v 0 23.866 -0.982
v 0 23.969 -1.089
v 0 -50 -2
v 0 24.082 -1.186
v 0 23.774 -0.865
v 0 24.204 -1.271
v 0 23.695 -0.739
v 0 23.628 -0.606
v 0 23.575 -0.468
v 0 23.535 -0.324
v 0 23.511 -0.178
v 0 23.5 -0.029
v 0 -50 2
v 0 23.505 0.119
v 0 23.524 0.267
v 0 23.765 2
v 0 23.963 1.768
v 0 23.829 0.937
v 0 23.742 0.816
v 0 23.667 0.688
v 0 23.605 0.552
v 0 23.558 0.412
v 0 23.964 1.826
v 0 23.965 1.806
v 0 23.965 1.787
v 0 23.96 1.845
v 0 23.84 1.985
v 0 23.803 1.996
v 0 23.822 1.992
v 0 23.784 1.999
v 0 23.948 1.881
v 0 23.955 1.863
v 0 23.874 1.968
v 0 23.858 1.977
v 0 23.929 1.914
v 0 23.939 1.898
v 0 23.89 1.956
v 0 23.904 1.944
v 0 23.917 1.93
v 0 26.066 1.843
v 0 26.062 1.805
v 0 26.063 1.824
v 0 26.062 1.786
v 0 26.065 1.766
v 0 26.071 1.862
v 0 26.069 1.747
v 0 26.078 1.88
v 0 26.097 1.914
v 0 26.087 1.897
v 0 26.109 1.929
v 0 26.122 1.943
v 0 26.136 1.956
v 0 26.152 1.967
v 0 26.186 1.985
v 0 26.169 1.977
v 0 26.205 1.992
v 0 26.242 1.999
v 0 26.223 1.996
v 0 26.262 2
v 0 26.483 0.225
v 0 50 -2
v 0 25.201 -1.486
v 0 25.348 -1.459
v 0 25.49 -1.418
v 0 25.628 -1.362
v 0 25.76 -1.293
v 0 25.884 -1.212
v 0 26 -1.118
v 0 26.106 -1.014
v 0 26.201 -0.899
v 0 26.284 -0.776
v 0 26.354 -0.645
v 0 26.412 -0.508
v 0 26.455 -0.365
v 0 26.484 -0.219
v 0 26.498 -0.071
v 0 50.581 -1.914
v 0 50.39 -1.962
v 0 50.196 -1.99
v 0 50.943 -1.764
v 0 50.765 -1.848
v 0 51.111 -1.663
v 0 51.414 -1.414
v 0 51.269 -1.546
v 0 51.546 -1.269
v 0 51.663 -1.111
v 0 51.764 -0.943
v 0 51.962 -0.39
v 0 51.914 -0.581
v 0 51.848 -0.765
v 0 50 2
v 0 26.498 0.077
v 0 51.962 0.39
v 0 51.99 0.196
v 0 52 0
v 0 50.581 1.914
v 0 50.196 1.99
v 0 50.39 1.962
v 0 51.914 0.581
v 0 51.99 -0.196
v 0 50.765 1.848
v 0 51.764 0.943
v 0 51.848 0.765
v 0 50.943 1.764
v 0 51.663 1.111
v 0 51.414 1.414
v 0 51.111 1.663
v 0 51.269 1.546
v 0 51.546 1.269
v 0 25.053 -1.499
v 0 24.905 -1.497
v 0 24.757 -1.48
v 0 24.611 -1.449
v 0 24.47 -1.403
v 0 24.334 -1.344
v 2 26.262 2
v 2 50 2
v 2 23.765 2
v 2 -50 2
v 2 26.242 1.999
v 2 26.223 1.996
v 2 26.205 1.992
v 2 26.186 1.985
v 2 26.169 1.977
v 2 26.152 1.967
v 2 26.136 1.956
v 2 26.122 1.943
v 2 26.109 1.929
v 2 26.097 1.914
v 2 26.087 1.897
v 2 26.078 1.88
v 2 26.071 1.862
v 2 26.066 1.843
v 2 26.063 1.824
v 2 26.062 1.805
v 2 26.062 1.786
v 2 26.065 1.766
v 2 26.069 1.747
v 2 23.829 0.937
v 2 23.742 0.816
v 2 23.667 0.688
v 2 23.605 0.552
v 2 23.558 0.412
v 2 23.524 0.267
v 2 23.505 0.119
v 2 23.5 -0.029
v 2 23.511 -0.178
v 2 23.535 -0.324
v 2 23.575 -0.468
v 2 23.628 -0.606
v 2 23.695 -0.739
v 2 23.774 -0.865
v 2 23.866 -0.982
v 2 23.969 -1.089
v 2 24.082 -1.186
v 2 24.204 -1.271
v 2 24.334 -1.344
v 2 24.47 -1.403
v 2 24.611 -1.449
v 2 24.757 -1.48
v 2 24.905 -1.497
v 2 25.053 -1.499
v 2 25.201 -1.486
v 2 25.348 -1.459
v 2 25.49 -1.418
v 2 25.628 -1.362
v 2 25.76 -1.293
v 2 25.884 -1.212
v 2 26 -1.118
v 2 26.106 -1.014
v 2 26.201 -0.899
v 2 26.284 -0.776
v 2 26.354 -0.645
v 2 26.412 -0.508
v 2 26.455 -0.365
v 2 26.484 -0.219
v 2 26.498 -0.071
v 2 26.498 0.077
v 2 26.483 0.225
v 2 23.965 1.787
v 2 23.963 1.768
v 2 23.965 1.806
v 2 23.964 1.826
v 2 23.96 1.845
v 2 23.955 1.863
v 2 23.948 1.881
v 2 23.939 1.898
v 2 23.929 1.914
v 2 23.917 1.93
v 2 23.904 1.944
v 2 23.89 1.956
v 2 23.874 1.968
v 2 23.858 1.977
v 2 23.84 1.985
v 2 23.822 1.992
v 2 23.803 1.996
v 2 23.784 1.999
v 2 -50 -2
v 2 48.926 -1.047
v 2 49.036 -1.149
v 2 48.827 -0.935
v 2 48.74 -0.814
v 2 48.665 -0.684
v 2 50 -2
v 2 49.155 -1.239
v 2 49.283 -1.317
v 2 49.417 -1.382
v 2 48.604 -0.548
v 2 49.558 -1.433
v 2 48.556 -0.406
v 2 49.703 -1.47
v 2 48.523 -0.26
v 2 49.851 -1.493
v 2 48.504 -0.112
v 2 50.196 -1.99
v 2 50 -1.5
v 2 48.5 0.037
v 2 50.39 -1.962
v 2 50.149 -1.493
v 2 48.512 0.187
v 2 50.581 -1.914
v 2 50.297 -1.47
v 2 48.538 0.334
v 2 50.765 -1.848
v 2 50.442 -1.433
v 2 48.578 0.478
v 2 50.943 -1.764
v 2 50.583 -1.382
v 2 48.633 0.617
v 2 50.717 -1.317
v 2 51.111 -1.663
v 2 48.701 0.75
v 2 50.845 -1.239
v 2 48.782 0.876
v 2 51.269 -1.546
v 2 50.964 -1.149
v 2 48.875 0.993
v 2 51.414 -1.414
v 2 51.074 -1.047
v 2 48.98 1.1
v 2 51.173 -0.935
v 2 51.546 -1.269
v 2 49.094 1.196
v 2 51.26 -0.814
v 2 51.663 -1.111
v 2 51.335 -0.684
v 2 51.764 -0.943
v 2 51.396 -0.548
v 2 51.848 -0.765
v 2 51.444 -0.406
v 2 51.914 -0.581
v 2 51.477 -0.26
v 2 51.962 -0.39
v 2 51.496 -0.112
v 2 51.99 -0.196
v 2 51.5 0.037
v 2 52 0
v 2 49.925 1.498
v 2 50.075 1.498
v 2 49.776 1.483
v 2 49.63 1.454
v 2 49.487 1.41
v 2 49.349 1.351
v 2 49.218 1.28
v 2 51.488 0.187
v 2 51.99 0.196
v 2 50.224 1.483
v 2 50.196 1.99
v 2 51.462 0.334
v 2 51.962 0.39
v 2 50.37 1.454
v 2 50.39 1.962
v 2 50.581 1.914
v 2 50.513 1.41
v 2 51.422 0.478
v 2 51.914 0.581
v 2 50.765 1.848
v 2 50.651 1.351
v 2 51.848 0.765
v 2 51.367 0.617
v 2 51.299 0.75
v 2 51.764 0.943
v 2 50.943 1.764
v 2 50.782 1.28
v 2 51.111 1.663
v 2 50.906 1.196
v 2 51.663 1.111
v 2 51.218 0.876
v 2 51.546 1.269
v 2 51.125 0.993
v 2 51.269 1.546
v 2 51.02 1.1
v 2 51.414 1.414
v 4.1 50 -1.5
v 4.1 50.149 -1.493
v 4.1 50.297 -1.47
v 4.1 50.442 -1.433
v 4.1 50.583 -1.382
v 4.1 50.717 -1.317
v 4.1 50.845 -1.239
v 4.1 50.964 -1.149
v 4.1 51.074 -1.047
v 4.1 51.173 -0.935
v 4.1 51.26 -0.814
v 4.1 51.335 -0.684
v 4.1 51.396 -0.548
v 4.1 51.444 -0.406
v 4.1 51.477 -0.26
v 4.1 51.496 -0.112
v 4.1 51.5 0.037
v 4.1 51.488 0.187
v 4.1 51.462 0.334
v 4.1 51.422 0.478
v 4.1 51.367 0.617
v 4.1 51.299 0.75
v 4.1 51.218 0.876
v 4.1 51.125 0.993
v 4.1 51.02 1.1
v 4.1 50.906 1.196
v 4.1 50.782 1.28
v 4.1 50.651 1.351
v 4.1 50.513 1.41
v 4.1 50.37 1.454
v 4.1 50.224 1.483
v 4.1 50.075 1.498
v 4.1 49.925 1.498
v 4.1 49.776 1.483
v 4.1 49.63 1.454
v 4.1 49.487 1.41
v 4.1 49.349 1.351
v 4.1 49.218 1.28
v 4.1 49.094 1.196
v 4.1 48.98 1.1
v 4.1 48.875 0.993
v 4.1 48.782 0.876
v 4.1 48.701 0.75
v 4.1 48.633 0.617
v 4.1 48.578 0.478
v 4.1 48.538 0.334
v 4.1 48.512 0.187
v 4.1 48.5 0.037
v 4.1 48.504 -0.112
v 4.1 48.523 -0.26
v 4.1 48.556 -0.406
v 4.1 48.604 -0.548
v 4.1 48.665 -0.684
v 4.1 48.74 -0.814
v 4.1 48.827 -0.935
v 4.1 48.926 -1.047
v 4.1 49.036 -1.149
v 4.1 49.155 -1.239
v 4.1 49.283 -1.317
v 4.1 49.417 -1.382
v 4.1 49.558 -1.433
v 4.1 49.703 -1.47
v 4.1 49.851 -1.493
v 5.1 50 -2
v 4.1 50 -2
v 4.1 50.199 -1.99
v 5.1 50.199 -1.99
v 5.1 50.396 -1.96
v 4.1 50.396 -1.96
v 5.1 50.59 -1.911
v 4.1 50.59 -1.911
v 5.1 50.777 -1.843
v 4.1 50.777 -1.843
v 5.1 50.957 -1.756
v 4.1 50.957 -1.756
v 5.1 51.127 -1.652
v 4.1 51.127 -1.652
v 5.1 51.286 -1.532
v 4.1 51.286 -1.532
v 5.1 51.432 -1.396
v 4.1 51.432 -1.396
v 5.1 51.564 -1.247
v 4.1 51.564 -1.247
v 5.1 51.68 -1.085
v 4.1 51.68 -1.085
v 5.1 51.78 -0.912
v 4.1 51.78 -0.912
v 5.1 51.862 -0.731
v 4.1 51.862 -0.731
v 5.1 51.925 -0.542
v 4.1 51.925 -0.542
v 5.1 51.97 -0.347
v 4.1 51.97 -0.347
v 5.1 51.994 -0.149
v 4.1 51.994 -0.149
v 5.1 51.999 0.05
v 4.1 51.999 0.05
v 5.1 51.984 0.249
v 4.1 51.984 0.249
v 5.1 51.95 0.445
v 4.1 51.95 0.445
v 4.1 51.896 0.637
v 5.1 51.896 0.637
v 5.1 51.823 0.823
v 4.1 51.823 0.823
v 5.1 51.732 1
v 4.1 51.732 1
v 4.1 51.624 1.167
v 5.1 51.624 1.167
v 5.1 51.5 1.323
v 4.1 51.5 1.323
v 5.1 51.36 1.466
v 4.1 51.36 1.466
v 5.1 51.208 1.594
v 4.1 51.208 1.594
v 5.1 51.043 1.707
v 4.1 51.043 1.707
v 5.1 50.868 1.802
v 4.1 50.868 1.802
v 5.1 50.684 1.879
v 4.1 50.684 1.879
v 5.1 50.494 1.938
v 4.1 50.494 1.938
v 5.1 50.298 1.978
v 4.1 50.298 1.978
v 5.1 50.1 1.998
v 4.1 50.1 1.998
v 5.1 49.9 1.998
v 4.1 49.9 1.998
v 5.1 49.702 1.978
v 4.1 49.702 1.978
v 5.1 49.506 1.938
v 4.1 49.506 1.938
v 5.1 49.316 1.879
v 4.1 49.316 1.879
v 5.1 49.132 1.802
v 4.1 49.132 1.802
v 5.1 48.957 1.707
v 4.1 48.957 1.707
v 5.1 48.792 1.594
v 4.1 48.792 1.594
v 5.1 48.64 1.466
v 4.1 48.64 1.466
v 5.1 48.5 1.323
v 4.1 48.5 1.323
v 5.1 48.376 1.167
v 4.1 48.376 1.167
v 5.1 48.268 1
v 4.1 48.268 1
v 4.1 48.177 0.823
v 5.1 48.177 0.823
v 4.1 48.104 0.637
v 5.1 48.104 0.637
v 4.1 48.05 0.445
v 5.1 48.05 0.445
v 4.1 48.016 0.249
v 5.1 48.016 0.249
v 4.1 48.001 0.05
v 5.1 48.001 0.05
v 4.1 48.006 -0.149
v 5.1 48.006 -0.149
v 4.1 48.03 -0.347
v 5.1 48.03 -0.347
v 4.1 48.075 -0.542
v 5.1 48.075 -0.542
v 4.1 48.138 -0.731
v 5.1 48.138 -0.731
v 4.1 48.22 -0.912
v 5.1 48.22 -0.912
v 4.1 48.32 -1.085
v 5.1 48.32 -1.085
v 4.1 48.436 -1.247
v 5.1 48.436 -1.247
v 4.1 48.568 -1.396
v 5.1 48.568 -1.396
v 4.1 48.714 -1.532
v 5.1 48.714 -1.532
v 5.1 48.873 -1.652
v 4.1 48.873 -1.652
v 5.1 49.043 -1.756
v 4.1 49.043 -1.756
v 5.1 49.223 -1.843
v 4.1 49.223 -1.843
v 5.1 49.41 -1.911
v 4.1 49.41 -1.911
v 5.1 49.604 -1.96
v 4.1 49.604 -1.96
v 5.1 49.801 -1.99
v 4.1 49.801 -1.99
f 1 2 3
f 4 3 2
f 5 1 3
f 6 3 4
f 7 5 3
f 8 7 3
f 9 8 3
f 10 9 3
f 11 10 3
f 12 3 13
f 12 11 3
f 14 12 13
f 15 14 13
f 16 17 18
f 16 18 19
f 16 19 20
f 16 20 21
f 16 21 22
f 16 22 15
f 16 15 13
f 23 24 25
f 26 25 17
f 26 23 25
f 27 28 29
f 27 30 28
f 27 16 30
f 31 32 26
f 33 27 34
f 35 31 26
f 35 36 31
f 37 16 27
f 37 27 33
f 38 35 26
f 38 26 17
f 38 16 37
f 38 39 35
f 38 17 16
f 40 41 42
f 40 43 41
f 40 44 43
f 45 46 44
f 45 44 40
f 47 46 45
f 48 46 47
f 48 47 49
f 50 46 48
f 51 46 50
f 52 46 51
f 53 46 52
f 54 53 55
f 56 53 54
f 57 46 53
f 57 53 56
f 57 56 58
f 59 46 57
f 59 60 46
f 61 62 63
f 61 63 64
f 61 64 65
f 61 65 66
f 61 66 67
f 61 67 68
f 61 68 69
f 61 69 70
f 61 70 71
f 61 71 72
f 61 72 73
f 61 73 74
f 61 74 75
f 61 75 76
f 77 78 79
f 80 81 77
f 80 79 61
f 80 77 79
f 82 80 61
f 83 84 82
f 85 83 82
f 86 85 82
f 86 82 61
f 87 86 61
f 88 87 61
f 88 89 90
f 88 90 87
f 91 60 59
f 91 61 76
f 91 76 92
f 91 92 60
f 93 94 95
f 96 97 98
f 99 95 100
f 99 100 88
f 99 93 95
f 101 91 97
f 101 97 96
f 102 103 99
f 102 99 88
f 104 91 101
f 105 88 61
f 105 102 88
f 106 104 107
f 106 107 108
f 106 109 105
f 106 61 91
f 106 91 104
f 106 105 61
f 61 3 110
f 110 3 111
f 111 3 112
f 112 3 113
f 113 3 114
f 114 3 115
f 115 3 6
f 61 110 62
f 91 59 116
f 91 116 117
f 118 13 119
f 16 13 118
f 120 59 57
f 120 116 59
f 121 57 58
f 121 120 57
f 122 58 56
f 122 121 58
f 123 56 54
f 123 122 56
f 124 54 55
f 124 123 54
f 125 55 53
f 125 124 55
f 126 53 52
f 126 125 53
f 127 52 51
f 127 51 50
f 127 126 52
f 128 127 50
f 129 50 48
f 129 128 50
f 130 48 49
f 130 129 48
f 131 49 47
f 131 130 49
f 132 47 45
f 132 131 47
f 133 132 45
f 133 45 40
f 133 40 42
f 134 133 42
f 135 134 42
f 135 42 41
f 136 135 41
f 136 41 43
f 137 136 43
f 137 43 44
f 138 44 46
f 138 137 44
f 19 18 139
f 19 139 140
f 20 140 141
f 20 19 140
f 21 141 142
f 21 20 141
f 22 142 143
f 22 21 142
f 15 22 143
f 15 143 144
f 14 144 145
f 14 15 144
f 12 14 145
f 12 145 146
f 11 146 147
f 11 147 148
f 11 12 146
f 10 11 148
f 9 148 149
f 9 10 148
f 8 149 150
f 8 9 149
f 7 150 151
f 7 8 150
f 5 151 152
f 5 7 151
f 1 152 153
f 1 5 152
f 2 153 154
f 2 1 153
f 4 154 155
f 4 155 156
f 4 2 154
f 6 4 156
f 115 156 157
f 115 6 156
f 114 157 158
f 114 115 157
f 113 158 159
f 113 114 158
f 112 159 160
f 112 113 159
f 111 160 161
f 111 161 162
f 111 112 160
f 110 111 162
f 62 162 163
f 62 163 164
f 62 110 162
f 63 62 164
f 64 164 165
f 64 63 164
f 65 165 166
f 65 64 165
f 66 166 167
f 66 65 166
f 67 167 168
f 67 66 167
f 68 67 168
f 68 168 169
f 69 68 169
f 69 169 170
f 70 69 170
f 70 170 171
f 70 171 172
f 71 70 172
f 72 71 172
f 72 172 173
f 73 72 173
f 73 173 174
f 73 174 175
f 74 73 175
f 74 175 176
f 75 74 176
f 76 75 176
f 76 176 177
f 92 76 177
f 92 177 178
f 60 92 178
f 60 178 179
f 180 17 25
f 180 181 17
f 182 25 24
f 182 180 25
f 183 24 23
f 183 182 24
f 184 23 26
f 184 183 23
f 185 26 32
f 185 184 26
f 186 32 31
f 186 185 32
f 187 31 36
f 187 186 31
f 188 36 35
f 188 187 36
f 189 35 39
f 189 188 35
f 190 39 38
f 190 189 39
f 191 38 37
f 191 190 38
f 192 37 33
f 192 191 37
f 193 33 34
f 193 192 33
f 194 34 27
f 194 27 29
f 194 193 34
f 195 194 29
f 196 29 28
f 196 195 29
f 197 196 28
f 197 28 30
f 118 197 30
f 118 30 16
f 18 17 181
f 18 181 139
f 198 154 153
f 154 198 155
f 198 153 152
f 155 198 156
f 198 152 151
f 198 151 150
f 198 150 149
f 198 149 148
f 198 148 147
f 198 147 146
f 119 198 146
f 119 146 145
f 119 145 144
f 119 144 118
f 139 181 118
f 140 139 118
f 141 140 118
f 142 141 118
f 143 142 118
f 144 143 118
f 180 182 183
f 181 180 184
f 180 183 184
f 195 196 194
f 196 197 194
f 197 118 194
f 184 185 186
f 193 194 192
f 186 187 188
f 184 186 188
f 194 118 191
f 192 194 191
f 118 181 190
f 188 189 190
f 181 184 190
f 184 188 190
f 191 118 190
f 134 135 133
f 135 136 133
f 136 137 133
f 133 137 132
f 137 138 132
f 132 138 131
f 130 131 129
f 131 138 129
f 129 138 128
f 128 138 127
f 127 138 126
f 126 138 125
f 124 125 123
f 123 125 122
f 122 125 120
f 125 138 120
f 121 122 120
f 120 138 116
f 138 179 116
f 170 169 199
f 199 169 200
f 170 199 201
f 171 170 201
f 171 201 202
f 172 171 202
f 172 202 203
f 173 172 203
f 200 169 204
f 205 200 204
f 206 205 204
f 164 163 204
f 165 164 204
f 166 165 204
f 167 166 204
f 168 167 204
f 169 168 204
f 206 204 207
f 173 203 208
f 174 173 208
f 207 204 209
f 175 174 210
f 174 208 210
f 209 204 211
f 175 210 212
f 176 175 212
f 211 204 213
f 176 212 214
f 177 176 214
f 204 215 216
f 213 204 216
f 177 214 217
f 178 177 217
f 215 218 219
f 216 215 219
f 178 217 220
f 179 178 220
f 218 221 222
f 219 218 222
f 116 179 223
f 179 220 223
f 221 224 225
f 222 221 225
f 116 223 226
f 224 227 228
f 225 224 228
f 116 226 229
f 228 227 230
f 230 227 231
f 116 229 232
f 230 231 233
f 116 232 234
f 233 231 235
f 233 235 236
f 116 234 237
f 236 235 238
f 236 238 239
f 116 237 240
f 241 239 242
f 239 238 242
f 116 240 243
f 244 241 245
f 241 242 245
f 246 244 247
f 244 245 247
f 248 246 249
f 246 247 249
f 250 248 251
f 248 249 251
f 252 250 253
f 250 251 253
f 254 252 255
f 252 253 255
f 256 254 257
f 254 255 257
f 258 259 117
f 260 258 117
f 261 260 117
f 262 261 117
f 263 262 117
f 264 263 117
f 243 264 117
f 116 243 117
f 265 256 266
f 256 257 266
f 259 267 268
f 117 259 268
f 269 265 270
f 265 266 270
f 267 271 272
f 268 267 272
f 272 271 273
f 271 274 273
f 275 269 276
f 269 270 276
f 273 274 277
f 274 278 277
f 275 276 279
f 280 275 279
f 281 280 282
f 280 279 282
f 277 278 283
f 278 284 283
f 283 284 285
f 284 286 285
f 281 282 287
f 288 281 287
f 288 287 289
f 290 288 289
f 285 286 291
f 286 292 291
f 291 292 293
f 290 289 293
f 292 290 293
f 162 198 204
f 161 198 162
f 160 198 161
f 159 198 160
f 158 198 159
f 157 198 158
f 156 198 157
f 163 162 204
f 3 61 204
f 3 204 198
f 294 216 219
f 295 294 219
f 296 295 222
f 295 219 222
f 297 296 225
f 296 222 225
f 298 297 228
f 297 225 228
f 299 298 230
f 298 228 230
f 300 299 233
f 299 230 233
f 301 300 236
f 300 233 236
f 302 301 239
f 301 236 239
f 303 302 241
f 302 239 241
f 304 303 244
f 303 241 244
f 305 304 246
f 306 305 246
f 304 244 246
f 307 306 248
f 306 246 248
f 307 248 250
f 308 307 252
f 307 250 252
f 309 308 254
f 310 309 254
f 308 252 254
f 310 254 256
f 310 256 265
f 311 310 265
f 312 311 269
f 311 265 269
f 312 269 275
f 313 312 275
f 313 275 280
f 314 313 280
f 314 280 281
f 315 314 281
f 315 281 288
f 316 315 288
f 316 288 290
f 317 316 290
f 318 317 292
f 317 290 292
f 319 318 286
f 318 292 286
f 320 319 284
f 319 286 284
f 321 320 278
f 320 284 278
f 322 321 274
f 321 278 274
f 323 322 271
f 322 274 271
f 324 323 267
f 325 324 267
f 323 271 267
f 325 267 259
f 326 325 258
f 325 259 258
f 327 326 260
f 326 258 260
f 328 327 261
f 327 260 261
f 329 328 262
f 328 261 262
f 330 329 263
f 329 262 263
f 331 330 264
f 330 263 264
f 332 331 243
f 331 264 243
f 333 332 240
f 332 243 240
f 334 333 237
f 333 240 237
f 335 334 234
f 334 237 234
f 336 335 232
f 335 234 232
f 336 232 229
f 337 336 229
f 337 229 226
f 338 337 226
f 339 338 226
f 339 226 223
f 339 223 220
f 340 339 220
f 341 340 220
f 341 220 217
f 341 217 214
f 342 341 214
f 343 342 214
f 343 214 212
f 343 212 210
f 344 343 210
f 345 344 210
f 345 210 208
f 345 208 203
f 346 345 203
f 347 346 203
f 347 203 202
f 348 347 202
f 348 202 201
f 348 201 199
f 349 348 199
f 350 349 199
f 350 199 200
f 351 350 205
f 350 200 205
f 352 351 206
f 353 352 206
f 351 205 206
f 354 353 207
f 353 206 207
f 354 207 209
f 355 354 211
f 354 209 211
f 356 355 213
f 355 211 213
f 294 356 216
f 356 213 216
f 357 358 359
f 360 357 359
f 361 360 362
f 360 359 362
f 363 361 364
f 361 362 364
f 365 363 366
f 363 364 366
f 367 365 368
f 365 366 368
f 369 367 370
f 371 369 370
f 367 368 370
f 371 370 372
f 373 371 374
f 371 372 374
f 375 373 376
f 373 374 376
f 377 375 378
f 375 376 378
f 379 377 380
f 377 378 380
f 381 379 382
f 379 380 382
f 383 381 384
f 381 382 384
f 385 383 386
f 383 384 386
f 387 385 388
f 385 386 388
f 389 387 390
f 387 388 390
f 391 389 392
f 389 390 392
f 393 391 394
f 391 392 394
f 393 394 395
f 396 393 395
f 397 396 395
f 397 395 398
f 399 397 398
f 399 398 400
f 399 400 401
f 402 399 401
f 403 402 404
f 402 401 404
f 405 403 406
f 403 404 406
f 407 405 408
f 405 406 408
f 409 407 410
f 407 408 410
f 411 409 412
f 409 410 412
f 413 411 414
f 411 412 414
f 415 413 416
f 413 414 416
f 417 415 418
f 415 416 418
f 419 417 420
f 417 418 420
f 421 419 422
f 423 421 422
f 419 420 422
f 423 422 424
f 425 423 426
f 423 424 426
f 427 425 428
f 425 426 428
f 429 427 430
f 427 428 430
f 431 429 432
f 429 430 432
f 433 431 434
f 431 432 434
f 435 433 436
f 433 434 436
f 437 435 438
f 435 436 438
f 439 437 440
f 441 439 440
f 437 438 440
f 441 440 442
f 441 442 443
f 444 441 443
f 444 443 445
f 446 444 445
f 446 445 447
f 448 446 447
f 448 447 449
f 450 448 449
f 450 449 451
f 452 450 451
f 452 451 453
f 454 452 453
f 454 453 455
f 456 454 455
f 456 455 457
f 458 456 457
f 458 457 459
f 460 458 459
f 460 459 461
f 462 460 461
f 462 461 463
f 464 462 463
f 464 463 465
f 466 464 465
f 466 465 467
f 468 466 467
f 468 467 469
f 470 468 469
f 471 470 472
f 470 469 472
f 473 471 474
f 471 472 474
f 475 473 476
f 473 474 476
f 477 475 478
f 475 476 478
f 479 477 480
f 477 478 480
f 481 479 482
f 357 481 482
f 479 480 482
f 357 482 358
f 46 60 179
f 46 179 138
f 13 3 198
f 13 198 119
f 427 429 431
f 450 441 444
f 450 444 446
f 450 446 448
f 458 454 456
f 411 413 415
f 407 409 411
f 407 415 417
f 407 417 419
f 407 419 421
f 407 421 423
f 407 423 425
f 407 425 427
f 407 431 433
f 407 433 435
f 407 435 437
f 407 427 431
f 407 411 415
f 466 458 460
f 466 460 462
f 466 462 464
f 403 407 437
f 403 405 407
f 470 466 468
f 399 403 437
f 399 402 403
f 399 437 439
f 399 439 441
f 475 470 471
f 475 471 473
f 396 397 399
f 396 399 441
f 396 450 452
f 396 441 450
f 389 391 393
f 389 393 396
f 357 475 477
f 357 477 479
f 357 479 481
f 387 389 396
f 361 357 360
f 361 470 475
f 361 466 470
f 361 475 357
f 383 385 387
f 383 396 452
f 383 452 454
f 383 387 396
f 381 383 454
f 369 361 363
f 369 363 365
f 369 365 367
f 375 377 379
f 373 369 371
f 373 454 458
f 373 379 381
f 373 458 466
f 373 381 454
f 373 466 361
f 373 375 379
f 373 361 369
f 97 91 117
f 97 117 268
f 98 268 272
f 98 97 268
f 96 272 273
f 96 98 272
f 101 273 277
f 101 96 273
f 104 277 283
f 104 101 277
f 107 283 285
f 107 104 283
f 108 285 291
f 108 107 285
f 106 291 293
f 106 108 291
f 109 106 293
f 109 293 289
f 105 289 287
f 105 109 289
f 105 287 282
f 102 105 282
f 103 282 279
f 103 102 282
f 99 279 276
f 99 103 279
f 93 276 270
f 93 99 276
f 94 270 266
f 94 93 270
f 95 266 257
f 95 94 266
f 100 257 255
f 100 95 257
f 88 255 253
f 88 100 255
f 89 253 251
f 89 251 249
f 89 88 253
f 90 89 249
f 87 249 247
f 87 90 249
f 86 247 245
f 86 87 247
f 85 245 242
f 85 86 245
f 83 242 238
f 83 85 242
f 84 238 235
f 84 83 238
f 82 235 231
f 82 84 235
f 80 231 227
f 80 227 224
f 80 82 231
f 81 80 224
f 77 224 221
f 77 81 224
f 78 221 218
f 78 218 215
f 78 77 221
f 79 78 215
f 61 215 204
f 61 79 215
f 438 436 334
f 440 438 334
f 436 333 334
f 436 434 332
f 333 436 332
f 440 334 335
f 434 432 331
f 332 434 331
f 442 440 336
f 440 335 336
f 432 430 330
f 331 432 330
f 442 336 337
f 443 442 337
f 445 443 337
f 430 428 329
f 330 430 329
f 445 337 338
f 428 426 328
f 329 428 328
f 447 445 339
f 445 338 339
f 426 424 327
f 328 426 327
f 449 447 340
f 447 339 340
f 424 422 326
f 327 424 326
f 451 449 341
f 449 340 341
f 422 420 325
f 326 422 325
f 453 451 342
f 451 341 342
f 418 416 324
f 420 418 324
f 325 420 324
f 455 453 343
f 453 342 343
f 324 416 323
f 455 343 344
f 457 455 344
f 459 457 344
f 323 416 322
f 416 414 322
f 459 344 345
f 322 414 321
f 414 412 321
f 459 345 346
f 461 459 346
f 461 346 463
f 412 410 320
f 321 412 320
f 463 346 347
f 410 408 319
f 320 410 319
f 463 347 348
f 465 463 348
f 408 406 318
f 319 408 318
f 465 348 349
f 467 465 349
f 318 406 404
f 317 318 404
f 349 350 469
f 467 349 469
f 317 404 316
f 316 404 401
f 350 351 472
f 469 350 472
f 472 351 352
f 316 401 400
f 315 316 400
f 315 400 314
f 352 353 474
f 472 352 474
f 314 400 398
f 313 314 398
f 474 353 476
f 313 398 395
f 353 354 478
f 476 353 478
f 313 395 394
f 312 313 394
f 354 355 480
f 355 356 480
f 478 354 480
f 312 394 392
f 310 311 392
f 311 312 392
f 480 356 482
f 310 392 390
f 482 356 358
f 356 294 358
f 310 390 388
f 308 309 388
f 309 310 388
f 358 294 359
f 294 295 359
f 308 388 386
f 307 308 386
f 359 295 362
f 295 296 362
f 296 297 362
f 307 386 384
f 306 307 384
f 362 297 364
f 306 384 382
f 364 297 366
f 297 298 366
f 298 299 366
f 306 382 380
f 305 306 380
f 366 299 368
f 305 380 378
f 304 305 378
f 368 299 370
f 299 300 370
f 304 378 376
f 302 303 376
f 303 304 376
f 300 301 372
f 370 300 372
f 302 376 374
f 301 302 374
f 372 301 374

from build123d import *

# Parameters (mm, degrees)
BASE_DEPTH         = 2
ESQUISSE2_R        = 1.5
BOSS_FIX_DEPTH     = 2.1
ESQUISSE3_R        = 2
BOSS_BLOCAGE_DEPTH = 1
VIDE_TIGE_DEPTH    = 2
CONGE_TIGE_R       = 0.2


with BuildPart() as part:
    # Esquisse1 → BASE (new body)
    with BuildSketch(Plane(origin=(0, 0, 0), x_dir=(0, 0, -1), z_dir=(1, 0, 0))):
        with BuildLine():
            Line((2, 50), (2, -50))
            Line((2, -50), (-2, -50))
            Line((-2, -50), (-2, 50))
            ThreePointArc((-2, 50), (0, 52), (2, 50))
        make_face()
    extrude(amount=BASE_DEPTH)

    # Esquisse2 → BOSS FIX (add)
    with BuildSketch(Plane(origin=(2, 0, 0), x_dir=(0, 0, -1), z_dir=(1, 0, 0))):
        with Locations((0, 50)):
            Circle(ESQUISSE2_R)
    extrude(amount=BOSS_FIX_DEPTH)

    # Esquisse3 → BOSS BLOCAGE (add)
    with BuildSketch(Plane(origin=(4.1, 0, 0), x_dir=(0, 0, -1), z_dir=(1, 0, 0))):
        with Locations((0, 50)):
            Circle(ESQUISSE3_R)
    extrude(amount=BOSS_BLOCAGE_DEPTH)

    # Esquisse4 → VIDE TIGE (cut)
    with BuildSketch(Plane.ZY):
        with BuildLine():
            Line((0.225177093, 26.483002116), (2, 26))
            Line((2, 26), (2, 24))
            Line((2, 24), (0.937042571, 23.828696786))
            ThreePointArc((0.937042571, 23.828696786), (-1.448800481, 24.611442197), (0.225177093, 26.483002116))
        make_face()
    extrude(amount=-VIDE_TIGE_DEPTH, mode=Mode.SUBTRACT)

    # CONGE TIGE
    conge_tige_edges = [part.edges().sort_by_distance(p)[0] for p in [
        (1, 24, 2),
        (1, 26, 2),
    ]]
    fillet(conge_tige_edges, radius=CONGE_TIGE_R)


solid = part.part
